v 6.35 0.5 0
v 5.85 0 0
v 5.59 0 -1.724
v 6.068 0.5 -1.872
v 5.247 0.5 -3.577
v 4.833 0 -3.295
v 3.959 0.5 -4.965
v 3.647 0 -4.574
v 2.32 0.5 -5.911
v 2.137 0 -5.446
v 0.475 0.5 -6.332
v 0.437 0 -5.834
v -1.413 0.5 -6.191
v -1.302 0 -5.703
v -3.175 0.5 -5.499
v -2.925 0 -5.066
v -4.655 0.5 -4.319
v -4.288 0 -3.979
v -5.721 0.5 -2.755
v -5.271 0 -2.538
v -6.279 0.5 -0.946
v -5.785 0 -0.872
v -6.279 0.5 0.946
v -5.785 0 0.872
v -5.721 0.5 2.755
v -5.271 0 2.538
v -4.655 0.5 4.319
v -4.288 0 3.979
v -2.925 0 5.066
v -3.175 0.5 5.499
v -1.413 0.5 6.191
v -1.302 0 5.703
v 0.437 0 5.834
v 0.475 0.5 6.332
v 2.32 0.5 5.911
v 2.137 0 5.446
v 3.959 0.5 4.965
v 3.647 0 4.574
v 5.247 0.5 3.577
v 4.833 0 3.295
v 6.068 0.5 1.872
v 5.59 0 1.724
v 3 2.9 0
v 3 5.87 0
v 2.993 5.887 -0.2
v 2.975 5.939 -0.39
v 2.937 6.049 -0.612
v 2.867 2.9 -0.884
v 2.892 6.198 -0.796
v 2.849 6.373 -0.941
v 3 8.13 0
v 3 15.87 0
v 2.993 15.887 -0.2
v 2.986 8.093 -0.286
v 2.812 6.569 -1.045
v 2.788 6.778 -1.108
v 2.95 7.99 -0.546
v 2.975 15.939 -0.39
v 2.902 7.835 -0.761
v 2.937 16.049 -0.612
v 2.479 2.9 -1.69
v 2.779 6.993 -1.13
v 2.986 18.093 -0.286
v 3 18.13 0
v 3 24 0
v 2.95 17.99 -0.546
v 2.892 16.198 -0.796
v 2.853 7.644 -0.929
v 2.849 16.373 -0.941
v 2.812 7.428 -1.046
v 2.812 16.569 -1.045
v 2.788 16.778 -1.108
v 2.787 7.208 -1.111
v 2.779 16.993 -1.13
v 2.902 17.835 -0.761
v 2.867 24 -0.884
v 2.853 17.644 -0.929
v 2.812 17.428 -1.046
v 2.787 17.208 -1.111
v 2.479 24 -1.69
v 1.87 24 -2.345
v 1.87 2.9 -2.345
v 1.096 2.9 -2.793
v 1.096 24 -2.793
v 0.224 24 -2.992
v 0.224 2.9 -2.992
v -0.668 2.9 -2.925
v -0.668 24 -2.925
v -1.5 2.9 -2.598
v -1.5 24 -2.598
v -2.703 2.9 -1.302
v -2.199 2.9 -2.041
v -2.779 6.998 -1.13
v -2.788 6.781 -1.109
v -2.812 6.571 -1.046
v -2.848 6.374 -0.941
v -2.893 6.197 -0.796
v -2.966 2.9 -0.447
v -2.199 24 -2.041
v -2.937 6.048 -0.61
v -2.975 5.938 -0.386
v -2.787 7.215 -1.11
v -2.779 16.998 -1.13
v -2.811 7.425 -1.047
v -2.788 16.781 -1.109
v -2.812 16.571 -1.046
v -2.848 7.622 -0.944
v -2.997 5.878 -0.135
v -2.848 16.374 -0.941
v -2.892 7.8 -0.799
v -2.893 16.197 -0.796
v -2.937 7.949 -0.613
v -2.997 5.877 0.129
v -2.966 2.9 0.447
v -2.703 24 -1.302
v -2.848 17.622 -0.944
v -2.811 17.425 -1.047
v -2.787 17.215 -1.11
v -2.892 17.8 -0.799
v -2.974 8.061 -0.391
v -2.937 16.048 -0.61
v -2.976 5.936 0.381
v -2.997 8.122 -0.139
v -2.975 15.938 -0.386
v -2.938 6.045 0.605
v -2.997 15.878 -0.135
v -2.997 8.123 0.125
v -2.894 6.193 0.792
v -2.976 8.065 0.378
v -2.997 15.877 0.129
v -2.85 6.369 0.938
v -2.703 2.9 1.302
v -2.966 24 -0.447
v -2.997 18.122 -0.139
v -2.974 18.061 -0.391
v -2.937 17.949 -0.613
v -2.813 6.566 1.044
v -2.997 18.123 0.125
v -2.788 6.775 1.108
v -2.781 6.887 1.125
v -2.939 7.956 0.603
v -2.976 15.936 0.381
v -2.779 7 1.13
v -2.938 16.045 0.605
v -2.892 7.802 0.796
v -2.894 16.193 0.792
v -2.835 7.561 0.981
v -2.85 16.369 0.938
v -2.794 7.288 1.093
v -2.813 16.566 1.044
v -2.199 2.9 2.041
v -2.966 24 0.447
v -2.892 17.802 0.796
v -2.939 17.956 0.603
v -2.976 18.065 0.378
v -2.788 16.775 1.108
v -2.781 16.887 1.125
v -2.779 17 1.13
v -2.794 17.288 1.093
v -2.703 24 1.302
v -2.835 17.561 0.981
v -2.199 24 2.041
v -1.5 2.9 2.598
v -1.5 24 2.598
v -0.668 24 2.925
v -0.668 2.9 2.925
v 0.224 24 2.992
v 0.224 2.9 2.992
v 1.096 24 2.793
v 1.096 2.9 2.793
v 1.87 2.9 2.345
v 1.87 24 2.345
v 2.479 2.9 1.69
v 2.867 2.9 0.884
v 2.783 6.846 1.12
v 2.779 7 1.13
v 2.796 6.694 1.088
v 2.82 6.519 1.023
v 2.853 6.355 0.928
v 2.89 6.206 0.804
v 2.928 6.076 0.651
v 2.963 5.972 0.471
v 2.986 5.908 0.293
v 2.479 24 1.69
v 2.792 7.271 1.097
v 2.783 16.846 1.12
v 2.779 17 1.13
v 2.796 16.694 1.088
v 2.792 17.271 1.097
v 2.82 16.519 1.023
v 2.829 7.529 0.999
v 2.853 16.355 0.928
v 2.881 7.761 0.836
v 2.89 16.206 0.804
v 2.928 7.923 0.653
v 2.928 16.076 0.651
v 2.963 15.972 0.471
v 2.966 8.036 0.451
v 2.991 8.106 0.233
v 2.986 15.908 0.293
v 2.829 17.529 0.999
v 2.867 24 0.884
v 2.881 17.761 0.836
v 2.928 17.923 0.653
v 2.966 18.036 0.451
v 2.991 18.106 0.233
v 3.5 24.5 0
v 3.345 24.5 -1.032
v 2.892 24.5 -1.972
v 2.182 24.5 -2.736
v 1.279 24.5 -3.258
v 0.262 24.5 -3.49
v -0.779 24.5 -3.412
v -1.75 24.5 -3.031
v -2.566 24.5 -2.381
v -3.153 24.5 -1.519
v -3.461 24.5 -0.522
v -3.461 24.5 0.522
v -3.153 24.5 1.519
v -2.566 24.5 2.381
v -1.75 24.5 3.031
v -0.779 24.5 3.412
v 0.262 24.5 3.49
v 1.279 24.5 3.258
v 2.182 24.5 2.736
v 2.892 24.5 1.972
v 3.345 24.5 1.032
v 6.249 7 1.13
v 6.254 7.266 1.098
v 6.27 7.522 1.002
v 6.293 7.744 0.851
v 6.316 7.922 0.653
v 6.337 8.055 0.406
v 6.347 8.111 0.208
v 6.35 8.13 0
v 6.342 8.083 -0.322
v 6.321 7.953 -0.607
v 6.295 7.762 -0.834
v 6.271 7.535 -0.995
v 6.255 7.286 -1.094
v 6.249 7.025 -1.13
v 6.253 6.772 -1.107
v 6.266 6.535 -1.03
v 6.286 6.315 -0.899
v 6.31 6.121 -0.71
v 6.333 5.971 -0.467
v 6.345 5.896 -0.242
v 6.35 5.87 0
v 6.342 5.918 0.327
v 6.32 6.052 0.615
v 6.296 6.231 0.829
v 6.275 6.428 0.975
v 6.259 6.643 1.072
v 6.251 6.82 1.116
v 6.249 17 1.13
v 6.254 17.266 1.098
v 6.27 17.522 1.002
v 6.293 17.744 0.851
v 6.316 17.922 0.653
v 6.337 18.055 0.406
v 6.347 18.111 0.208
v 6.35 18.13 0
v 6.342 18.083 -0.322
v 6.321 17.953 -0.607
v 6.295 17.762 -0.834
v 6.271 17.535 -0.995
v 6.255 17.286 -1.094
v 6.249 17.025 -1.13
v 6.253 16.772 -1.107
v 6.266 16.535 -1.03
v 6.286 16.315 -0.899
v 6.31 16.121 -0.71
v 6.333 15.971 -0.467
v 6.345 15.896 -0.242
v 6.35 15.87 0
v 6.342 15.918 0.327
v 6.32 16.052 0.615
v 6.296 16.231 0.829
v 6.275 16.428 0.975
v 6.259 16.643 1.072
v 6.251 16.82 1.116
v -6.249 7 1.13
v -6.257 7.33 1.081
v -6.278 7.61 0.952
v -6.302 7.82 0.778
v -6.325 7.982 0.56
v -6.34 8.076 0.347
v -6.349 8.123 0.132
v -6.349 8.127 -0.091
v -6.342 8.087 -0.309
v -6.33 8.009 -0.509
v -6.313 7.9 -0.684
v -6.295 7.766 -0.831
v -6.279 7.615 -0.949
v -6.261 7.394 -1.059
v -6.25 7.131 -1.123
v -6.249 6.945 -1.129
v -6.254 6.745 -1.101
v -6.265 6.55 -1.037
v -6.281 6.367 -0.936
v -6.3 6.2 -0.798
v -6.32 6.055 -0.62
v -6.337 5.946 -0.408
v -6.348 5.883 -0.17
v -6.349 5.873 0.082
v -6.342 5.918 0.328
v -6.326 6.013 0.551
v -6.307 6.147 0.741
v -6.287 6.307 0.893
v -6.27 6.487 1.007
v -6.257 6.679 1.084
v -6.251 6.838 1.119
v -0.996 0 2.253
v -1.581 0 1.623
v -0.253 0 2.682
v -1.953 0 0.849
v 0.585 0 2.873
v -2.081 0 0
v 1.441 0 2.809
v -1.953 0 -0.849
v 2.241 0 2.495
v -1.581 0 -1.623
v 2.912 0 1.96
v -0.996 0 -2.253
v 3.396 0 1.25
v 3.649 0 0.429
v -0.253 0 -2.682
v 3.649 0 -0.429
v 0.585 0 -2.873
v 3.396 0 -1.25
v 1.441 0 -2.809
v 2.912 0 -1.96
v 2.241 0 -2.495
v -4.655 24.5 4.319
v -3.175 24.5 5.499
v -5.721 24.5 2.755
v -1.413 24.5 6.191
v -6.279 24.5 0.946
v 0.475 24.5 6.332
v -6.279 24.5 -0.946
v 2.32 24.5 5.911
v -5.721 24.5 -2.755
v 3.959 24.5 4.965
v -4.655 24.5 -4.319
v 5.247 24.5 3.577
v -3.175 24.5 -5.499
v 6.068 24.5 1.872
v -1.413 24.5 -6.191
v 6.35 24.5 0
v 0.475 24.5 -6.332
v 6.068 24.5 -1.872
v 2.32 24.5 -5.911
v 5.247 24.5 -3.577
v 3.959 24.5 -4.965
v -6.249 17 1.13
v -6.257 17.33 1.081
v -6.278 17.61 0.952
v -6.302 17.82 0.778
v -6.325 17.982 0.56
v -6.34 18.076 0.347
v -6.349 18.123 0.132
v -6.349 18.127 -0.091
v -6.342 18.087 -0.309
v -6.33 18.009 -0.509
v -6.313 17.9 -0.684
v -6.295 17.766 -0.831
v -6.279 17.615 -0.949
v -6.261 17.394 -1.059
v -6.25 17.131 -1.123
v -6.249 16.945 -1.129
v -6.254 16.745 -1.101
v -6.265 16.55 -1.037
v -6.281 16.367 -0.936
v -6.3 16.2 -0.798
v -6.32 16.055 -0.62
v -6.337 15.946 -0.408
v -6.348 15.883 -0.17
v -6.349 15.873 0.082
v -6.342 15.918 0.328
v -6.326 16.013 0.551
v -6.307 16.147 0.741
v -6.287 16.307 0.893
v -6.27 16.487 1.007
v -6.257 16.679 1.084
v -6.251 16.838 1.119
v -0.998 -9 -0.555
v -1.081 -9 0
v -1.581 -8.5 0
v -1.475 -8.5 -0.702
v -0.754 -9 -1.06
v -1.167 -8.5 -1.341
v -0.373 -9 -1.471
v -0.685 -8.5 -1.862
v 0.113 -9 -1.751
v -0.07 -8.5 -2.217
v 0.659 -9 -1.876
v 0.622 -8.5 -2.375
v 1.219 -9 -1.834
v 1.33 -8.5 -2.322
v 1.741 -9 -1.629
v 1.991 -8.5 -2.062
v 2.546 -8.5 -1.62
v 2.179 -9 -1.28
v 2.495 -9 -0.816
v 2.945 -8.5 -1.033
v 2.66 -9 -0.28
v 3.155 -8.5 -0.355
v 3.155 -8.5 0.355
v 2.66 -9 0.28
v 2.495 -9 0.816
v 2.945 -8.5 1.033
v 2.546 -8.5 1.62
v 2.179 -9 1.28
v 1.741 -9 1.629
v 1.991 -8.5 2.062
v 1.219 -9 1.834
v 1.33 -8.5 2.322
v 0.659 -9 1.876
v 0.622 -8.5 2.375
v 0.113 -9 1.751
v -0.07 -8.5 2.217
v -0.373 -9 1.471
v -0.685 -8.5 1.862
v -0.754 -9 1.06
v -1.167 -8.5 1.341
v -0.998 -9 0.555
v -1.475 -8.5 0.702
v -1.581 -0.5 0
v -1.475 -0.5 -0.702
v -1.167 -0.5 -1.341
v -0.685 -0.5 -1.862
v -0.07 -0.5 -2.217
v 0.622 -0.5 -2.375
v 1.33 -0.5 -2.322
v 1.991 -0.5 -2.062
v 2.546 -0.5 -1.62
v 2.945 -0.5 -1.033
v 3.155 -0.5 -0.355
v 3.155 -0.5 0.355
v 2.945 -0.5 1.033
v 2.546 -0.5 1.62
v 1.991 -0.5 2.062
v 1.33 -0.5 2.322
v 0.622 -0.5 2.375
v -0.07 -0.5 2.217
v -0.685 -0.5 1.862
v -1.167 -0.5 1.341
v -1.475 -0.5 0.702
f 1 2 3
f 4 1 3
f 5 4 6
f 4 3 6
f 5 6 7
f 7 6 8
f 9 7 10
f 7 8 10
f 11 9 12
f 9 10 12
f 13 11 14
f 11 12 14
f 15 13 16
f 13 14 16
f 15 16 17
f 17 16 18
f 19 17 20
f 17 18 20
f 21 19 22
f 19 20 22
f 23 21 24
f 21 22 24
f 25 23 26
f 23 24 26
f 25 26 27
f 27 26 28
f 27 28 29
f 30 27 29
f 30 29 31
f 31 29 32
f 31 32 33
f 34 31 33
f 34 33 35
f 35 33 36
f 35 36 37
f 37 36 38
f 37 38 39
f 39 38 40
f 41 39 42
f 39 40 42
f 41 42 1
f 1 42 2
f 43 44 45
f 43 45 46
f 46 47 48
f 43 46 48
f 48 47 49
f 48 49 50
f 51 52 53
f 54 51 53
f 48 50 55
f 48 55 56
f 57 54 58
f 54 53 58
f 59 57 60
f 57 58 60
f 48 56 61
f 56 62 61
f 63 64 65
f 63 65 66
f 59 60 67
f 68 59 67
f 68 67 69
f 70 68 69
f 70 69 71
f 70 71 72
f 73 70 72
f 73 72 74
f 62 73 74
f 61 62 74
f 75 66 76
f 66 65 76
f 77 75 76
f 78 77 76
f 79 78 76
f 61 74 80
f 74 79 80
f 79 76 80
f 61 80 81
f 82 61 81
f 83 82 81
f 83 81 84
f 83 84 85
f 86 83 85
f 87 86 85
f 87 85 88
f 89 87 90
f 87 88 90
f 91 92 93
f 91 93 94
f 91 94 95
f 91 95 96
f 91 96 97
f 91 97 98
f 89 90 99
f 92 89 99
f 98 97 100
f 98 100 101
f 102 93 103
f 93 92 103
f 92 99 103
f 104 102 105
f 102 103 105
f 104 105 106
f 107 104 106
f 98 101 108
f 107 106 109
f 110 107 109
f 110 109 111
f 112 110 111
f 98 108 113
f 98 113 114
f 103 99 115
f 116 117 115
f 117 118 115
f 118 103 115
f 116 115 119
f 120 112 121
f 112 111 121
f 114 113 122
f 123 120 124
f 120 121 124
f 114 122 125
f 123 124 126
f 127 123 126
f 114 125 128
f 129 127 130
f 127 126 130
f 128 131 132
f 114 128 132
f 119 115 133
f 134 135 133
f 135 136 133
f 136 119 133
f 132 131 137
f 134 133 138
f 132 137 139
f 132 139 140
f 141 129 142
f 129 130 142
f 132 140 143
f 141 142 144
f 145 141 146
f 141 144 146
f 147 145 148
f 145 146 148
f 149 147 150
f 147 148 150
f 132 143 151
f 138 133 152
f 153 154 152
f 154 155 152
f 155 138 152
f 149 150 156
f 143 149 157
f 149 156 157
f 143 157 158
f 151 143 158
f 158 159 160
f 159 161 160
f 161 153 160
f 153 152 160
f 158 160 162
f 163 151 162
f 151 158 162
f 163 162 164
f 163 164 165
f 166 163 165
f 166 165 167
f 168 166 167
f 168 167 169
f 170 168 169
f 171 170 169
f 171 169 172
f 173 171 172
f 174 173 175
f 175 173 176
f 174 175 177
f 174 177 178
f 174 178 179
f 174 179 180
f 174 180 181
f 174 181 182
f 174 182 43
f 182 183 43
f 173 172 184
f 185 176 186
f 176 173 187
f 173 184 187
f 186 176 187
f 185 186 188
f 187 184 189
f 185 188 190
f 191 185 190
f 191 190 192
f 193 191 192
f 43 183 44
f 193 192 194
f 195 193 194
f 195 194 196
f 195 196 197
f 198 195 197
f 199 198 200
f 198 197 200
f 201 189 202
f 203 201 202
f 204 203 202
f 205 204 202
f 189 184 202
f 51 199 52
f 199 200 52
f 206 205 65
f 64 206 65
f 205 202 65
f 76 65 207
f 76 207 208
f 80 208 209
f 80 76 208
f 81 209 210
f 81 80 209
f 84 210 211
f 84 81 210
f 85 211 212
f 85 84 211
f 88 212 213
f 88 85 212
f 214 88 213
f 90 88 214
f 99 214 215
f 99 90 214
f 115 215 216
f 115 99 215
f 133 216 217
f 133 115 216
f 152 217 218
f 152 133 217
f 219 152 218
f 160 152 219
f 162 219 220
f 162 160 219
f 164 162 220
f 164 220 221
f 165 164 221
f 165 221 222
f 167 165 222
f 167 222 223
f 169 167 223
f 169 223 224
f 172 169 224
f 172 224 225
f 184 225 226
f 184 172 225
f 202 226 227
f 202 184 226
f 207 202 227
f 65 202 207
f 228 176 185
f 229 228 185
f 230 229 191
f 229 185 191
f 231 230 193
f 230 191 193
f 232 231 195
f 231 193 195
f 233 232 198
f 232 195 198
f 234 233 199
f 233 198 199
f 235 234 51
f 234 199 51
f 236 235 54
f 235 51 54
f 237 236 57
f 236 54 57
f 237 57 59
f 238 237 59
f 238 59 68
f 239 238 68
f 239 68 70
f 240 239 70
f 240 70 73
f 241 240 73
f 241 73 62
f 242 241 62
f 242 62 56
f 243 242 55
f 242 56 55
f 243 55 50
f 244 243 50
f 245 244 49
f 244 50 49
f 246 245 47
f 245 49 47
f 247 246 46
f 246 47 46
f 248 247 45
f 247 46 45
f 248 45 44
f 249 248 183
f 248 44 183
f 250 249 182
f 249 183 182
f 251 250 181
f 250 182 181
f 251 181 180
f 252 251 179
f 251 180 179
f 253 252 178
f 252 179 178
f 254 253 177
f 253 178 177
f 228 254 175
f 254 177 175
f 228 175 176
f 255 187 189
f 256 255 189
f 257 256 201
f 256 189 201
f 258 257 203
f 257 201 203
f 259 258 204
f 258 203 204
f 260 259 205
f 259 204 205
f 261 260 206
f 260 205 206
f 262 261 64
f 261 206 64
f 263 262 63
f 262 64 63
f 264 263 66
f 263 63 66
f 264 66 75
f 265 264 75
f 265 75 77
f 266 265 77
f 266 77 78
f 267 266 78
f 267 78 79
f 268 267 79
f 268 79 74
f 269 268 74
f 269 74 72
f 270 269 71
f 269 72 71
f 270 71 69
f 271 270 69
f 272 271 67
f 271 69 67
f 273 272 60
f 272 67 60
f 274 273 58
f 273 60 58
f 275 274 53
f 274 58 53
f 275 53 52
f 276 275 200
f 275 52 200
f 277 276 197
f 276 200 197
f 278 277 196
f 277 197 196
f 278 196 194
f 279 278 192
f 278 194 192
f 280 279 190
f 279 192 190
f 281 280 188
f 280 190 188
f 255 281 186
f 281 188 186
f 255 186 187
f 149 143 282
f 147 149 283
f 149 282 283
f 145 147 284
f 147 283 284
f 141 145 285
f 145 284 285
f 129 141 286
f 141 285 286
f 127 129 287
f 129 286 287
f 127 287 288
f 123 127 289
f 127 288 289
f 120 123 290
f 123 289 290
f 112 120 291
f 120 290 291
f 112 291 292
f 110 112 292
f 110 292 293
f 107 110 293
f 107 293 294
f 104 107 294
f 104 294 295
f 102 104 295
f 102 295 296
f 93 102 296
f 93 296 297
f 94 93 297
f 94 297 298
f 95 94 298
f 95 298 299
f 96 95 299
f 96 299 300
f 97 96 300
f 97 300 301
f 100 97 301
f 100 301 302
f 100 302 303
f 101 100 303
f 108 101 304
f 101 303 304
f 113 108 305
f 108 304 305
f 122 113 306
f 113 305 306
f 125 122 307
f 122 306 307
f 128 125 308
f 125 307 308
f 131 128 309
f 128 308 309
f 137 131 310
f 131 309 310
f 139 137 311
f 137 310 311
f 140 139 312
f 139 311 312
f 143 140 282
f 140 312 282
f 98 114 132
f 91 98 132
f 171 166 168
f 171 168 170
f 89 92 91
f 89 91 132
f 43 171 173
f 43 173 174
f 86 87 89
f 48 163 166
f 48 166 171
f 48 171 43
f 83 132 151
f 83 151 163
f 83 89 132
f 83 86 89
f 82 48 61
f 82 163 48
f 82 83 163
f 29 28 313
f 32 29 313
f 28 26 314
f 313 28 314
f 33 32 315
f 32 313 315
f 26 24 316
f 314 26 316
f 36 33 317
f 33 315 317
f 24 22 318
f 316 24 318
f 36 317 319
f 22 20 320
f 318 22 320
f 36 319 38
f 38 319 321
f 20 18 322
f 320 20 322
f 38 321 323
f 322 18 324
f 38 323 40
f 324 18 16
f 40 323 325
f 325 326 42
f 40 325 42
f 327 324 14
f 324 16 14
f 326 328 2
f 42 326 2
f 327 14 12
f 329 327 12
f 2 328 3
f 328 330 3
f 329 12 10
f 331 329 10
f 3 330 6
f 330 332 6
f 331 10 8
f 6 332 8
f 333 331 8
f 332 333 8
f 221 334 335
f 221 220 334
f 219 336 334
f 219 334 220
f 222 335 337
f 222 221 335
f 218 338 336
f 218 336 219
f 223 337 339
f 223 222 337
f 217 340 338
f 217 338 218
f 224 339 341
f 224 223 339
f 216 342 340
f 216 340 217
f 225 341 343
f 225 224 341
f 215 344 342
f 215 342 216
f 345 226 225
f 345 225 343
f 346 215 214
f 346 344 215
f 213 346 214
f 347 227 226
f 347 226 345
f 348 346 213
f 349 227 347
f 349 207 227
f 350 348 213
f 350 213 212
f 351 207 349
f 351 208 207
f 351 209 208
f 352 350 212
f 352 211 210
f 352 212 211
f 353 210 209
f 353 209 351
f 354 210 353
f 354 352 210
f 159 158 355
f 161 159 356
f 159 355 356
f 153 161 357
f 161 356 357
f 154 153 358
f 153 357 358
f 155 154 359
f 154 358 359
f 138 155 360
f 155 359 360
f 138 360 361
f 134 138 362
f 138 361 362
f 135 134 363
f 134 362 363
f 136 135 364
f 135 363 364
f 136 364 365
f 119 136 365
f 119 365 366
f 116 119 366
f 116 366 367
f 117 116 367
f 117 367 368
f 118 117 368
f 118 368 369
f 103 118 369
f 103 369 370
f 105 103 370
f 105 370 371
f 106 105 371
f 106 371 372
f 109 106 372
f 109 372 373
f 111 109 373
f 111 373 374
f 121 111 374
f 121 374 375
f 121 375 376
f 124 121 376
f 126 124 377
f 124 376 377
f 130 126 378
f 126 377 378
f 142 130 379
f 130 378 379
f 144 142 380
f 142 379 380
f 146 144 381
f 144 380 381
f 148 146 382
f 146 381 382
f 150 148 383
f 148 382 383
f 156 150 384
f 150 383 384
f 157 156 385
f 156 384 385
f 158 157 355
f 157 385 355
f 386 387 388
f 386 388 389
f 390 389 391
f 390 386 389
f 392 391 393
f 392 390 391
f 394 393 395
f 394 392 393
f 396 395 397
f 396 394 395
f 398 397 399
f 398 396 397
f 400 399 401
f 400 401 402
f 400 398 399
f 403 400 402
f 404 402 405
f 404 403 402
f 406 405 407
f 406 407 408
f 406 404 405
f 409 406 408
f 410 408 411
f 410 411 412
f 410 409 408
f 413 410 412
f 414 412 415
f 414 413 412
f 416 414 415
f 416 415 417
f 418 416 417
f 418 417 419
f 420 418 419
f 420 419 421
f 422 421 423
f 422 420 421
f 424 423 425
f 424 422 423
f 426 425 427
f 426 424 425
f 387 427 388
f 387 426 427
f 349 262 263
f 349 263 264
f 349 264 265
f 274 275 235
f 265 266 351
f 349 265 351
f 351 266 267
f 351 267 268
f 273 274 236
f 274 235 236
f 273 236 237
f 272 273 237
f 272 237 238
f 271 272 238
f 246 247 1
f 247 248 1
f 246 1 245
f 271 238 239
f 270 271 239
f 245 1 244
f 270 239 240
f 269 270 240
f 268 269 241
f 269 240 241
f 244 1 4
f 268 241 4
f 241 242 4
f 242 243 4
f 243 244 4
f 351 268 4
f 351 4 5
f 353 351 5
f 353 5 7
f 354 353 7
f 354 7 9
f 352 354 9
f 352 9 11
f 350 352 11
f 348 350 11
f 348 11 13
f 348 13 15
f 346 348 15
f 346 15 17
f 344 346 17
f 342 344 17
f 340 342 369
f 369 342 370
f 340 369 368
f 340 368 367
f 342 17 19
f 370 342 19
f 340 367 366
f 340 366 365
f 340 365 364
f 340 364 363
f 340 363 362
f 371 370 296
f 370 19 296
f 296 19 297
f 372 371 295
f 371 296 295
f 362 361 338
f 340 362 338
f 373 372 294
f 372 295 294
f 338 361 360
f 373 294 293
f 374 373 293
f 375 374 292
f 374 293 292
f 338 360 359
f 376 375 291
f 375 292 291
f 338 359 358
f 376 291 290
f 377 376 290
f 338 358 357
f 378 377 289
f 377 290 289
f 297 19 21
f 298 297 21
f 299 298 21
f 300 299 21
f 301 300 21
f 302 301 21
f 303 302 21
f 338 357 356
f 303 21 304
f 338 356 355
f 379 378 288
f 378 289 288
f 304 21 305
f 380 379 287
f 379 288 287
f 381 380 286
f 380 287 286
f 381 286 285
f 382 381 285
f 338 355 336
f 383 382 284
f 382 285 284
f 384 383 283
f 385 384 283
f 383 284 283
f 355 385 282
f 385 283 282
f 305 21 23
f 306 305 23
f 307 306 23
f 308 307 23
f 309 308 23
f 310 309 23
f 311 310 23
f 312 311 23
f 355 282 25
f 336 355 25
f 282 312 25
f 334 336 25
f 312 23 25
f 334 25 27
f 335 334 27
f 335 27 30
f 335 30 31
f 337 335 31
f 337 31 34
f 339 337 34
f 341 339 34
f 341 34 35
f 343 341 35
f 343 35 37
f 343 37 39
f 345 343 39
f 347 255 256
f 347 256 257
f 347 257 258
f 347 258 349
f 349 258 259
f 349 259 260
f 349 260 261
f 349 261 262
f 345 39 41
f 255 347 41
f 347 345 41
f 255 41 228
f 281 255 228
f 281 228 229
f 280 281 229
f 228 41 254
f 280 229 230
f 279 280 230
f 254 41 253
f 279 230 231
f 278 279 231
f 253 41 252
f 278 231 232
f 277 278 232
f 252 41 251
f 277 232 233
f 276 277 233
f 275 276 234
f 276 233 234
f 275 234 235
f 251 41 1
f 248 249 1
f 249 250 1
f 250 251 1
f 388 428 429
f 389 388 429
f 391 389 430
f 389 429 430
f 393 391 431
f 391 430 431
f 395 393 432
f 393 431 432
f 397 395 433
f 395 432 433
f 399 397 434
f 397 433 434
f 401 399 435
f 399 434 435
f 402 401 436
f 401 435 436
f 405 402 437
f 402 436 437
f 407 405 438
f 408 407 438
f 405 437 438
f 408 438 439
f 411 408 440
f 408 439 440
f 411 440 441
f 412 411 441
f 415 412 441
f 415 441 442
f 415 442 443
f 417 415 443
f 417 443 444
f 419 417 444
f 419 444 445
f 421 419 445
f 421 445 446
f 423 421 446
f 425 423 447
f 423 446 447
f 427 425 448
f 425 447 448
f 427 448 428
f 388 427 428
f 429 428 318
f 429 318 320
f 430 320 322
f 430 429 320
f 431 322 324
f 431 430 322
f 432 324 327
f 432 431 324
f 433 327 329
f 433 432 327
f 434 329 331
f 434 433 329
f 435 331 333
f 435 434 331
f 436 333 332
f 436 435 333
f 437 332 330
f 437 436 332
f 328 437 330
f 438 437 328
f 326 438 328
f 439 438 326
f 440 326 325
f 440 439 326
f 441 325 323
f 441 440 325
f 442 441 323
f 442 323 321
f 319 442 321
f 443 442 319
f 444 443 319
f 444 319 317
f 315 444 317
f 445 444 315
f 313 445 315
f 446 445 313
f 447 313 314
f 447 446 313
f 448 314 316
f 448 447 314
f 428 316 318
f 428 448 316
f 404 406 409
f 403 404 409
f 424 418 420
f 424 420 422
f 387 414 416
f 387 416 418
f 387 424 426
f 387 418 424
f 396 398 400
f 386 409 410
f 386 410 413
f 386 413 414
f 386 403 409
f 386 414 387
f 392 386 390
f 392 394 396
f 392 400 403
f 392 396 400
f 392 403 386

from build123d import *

# Parameters (mm, degrees)
SKETCH1_R             = 6.35
BOSS_EXTRUDE1_DEPTH   = 24.5
SKETCH2_R             = 3
CUT_EXTRUDE1_DEPTH    = 21.6
F_4_40_TAPPED_HOLE1_D = 2.2606
SKETCH5_R             = 2.38125
BOSS_EXTRUDE2_DEPTH   = 9
CHAMFER2_SIZE         = 0.5


with BuildPart() as part:
    # Sketch1 → Boss-Extrude1 (new body)
    with BuildSketch(Plane(origin=(0, 0, 0), x_dir=(1, 0, 0), z_dir=(0, 1, 0))):
        Circle(SKETCH1_R)
    extrude(amount=BOSS_EXTRUDE1_DEPTH)

    # Sketch2 → Cut-Extrude1 (cut)
    with BuildSketch(Plane(origin=(0, 24.5, 0), x_dir=(1, 0, 0), z_dir=(0, 1, 0))):
        Circle(SKETCH2_R)
    extrude(amount=-CUT_EXTRUDE1_DEPTH, mode=Mode.SUBTRACT)

    # #4-40 Tapped Hole1 (through all)
    with Locations(Plane(origin=(6.35, 0, 0), x_dir=(0, 0, -1), z_dir=(1, 0, 0))):
        with Locations((0, 17), (0, 7)):
            Hole(F_4_40_TAPPED_HOLE1_D / 2)

    # Sketch5 → Boss-Extrude2 (add)
    with BuildSketch(Plane(origin=(0, 0, 0), x_dir=(-1, 0, 0), z_dir=(0, -1, 0))):
        with Locations((-0.8, 0)):
            Circle(SKETCH5_R)
    extrude(amount=BOSS_EXTRUDE2_DEPTH)

    # Chamfer2
    chamfer2_edges = [part.edges().sort_by_distance(p)[0] for p in [
        (-6.35, 0, 0),
        (3.18125, 0, 0),
        (3.18125, -9, 0),
        (-3, 24.5, 0),
    ]]
    chamfer(chamfer2_edges, length=CHAMFER2_SIZE)


solid = part.part
